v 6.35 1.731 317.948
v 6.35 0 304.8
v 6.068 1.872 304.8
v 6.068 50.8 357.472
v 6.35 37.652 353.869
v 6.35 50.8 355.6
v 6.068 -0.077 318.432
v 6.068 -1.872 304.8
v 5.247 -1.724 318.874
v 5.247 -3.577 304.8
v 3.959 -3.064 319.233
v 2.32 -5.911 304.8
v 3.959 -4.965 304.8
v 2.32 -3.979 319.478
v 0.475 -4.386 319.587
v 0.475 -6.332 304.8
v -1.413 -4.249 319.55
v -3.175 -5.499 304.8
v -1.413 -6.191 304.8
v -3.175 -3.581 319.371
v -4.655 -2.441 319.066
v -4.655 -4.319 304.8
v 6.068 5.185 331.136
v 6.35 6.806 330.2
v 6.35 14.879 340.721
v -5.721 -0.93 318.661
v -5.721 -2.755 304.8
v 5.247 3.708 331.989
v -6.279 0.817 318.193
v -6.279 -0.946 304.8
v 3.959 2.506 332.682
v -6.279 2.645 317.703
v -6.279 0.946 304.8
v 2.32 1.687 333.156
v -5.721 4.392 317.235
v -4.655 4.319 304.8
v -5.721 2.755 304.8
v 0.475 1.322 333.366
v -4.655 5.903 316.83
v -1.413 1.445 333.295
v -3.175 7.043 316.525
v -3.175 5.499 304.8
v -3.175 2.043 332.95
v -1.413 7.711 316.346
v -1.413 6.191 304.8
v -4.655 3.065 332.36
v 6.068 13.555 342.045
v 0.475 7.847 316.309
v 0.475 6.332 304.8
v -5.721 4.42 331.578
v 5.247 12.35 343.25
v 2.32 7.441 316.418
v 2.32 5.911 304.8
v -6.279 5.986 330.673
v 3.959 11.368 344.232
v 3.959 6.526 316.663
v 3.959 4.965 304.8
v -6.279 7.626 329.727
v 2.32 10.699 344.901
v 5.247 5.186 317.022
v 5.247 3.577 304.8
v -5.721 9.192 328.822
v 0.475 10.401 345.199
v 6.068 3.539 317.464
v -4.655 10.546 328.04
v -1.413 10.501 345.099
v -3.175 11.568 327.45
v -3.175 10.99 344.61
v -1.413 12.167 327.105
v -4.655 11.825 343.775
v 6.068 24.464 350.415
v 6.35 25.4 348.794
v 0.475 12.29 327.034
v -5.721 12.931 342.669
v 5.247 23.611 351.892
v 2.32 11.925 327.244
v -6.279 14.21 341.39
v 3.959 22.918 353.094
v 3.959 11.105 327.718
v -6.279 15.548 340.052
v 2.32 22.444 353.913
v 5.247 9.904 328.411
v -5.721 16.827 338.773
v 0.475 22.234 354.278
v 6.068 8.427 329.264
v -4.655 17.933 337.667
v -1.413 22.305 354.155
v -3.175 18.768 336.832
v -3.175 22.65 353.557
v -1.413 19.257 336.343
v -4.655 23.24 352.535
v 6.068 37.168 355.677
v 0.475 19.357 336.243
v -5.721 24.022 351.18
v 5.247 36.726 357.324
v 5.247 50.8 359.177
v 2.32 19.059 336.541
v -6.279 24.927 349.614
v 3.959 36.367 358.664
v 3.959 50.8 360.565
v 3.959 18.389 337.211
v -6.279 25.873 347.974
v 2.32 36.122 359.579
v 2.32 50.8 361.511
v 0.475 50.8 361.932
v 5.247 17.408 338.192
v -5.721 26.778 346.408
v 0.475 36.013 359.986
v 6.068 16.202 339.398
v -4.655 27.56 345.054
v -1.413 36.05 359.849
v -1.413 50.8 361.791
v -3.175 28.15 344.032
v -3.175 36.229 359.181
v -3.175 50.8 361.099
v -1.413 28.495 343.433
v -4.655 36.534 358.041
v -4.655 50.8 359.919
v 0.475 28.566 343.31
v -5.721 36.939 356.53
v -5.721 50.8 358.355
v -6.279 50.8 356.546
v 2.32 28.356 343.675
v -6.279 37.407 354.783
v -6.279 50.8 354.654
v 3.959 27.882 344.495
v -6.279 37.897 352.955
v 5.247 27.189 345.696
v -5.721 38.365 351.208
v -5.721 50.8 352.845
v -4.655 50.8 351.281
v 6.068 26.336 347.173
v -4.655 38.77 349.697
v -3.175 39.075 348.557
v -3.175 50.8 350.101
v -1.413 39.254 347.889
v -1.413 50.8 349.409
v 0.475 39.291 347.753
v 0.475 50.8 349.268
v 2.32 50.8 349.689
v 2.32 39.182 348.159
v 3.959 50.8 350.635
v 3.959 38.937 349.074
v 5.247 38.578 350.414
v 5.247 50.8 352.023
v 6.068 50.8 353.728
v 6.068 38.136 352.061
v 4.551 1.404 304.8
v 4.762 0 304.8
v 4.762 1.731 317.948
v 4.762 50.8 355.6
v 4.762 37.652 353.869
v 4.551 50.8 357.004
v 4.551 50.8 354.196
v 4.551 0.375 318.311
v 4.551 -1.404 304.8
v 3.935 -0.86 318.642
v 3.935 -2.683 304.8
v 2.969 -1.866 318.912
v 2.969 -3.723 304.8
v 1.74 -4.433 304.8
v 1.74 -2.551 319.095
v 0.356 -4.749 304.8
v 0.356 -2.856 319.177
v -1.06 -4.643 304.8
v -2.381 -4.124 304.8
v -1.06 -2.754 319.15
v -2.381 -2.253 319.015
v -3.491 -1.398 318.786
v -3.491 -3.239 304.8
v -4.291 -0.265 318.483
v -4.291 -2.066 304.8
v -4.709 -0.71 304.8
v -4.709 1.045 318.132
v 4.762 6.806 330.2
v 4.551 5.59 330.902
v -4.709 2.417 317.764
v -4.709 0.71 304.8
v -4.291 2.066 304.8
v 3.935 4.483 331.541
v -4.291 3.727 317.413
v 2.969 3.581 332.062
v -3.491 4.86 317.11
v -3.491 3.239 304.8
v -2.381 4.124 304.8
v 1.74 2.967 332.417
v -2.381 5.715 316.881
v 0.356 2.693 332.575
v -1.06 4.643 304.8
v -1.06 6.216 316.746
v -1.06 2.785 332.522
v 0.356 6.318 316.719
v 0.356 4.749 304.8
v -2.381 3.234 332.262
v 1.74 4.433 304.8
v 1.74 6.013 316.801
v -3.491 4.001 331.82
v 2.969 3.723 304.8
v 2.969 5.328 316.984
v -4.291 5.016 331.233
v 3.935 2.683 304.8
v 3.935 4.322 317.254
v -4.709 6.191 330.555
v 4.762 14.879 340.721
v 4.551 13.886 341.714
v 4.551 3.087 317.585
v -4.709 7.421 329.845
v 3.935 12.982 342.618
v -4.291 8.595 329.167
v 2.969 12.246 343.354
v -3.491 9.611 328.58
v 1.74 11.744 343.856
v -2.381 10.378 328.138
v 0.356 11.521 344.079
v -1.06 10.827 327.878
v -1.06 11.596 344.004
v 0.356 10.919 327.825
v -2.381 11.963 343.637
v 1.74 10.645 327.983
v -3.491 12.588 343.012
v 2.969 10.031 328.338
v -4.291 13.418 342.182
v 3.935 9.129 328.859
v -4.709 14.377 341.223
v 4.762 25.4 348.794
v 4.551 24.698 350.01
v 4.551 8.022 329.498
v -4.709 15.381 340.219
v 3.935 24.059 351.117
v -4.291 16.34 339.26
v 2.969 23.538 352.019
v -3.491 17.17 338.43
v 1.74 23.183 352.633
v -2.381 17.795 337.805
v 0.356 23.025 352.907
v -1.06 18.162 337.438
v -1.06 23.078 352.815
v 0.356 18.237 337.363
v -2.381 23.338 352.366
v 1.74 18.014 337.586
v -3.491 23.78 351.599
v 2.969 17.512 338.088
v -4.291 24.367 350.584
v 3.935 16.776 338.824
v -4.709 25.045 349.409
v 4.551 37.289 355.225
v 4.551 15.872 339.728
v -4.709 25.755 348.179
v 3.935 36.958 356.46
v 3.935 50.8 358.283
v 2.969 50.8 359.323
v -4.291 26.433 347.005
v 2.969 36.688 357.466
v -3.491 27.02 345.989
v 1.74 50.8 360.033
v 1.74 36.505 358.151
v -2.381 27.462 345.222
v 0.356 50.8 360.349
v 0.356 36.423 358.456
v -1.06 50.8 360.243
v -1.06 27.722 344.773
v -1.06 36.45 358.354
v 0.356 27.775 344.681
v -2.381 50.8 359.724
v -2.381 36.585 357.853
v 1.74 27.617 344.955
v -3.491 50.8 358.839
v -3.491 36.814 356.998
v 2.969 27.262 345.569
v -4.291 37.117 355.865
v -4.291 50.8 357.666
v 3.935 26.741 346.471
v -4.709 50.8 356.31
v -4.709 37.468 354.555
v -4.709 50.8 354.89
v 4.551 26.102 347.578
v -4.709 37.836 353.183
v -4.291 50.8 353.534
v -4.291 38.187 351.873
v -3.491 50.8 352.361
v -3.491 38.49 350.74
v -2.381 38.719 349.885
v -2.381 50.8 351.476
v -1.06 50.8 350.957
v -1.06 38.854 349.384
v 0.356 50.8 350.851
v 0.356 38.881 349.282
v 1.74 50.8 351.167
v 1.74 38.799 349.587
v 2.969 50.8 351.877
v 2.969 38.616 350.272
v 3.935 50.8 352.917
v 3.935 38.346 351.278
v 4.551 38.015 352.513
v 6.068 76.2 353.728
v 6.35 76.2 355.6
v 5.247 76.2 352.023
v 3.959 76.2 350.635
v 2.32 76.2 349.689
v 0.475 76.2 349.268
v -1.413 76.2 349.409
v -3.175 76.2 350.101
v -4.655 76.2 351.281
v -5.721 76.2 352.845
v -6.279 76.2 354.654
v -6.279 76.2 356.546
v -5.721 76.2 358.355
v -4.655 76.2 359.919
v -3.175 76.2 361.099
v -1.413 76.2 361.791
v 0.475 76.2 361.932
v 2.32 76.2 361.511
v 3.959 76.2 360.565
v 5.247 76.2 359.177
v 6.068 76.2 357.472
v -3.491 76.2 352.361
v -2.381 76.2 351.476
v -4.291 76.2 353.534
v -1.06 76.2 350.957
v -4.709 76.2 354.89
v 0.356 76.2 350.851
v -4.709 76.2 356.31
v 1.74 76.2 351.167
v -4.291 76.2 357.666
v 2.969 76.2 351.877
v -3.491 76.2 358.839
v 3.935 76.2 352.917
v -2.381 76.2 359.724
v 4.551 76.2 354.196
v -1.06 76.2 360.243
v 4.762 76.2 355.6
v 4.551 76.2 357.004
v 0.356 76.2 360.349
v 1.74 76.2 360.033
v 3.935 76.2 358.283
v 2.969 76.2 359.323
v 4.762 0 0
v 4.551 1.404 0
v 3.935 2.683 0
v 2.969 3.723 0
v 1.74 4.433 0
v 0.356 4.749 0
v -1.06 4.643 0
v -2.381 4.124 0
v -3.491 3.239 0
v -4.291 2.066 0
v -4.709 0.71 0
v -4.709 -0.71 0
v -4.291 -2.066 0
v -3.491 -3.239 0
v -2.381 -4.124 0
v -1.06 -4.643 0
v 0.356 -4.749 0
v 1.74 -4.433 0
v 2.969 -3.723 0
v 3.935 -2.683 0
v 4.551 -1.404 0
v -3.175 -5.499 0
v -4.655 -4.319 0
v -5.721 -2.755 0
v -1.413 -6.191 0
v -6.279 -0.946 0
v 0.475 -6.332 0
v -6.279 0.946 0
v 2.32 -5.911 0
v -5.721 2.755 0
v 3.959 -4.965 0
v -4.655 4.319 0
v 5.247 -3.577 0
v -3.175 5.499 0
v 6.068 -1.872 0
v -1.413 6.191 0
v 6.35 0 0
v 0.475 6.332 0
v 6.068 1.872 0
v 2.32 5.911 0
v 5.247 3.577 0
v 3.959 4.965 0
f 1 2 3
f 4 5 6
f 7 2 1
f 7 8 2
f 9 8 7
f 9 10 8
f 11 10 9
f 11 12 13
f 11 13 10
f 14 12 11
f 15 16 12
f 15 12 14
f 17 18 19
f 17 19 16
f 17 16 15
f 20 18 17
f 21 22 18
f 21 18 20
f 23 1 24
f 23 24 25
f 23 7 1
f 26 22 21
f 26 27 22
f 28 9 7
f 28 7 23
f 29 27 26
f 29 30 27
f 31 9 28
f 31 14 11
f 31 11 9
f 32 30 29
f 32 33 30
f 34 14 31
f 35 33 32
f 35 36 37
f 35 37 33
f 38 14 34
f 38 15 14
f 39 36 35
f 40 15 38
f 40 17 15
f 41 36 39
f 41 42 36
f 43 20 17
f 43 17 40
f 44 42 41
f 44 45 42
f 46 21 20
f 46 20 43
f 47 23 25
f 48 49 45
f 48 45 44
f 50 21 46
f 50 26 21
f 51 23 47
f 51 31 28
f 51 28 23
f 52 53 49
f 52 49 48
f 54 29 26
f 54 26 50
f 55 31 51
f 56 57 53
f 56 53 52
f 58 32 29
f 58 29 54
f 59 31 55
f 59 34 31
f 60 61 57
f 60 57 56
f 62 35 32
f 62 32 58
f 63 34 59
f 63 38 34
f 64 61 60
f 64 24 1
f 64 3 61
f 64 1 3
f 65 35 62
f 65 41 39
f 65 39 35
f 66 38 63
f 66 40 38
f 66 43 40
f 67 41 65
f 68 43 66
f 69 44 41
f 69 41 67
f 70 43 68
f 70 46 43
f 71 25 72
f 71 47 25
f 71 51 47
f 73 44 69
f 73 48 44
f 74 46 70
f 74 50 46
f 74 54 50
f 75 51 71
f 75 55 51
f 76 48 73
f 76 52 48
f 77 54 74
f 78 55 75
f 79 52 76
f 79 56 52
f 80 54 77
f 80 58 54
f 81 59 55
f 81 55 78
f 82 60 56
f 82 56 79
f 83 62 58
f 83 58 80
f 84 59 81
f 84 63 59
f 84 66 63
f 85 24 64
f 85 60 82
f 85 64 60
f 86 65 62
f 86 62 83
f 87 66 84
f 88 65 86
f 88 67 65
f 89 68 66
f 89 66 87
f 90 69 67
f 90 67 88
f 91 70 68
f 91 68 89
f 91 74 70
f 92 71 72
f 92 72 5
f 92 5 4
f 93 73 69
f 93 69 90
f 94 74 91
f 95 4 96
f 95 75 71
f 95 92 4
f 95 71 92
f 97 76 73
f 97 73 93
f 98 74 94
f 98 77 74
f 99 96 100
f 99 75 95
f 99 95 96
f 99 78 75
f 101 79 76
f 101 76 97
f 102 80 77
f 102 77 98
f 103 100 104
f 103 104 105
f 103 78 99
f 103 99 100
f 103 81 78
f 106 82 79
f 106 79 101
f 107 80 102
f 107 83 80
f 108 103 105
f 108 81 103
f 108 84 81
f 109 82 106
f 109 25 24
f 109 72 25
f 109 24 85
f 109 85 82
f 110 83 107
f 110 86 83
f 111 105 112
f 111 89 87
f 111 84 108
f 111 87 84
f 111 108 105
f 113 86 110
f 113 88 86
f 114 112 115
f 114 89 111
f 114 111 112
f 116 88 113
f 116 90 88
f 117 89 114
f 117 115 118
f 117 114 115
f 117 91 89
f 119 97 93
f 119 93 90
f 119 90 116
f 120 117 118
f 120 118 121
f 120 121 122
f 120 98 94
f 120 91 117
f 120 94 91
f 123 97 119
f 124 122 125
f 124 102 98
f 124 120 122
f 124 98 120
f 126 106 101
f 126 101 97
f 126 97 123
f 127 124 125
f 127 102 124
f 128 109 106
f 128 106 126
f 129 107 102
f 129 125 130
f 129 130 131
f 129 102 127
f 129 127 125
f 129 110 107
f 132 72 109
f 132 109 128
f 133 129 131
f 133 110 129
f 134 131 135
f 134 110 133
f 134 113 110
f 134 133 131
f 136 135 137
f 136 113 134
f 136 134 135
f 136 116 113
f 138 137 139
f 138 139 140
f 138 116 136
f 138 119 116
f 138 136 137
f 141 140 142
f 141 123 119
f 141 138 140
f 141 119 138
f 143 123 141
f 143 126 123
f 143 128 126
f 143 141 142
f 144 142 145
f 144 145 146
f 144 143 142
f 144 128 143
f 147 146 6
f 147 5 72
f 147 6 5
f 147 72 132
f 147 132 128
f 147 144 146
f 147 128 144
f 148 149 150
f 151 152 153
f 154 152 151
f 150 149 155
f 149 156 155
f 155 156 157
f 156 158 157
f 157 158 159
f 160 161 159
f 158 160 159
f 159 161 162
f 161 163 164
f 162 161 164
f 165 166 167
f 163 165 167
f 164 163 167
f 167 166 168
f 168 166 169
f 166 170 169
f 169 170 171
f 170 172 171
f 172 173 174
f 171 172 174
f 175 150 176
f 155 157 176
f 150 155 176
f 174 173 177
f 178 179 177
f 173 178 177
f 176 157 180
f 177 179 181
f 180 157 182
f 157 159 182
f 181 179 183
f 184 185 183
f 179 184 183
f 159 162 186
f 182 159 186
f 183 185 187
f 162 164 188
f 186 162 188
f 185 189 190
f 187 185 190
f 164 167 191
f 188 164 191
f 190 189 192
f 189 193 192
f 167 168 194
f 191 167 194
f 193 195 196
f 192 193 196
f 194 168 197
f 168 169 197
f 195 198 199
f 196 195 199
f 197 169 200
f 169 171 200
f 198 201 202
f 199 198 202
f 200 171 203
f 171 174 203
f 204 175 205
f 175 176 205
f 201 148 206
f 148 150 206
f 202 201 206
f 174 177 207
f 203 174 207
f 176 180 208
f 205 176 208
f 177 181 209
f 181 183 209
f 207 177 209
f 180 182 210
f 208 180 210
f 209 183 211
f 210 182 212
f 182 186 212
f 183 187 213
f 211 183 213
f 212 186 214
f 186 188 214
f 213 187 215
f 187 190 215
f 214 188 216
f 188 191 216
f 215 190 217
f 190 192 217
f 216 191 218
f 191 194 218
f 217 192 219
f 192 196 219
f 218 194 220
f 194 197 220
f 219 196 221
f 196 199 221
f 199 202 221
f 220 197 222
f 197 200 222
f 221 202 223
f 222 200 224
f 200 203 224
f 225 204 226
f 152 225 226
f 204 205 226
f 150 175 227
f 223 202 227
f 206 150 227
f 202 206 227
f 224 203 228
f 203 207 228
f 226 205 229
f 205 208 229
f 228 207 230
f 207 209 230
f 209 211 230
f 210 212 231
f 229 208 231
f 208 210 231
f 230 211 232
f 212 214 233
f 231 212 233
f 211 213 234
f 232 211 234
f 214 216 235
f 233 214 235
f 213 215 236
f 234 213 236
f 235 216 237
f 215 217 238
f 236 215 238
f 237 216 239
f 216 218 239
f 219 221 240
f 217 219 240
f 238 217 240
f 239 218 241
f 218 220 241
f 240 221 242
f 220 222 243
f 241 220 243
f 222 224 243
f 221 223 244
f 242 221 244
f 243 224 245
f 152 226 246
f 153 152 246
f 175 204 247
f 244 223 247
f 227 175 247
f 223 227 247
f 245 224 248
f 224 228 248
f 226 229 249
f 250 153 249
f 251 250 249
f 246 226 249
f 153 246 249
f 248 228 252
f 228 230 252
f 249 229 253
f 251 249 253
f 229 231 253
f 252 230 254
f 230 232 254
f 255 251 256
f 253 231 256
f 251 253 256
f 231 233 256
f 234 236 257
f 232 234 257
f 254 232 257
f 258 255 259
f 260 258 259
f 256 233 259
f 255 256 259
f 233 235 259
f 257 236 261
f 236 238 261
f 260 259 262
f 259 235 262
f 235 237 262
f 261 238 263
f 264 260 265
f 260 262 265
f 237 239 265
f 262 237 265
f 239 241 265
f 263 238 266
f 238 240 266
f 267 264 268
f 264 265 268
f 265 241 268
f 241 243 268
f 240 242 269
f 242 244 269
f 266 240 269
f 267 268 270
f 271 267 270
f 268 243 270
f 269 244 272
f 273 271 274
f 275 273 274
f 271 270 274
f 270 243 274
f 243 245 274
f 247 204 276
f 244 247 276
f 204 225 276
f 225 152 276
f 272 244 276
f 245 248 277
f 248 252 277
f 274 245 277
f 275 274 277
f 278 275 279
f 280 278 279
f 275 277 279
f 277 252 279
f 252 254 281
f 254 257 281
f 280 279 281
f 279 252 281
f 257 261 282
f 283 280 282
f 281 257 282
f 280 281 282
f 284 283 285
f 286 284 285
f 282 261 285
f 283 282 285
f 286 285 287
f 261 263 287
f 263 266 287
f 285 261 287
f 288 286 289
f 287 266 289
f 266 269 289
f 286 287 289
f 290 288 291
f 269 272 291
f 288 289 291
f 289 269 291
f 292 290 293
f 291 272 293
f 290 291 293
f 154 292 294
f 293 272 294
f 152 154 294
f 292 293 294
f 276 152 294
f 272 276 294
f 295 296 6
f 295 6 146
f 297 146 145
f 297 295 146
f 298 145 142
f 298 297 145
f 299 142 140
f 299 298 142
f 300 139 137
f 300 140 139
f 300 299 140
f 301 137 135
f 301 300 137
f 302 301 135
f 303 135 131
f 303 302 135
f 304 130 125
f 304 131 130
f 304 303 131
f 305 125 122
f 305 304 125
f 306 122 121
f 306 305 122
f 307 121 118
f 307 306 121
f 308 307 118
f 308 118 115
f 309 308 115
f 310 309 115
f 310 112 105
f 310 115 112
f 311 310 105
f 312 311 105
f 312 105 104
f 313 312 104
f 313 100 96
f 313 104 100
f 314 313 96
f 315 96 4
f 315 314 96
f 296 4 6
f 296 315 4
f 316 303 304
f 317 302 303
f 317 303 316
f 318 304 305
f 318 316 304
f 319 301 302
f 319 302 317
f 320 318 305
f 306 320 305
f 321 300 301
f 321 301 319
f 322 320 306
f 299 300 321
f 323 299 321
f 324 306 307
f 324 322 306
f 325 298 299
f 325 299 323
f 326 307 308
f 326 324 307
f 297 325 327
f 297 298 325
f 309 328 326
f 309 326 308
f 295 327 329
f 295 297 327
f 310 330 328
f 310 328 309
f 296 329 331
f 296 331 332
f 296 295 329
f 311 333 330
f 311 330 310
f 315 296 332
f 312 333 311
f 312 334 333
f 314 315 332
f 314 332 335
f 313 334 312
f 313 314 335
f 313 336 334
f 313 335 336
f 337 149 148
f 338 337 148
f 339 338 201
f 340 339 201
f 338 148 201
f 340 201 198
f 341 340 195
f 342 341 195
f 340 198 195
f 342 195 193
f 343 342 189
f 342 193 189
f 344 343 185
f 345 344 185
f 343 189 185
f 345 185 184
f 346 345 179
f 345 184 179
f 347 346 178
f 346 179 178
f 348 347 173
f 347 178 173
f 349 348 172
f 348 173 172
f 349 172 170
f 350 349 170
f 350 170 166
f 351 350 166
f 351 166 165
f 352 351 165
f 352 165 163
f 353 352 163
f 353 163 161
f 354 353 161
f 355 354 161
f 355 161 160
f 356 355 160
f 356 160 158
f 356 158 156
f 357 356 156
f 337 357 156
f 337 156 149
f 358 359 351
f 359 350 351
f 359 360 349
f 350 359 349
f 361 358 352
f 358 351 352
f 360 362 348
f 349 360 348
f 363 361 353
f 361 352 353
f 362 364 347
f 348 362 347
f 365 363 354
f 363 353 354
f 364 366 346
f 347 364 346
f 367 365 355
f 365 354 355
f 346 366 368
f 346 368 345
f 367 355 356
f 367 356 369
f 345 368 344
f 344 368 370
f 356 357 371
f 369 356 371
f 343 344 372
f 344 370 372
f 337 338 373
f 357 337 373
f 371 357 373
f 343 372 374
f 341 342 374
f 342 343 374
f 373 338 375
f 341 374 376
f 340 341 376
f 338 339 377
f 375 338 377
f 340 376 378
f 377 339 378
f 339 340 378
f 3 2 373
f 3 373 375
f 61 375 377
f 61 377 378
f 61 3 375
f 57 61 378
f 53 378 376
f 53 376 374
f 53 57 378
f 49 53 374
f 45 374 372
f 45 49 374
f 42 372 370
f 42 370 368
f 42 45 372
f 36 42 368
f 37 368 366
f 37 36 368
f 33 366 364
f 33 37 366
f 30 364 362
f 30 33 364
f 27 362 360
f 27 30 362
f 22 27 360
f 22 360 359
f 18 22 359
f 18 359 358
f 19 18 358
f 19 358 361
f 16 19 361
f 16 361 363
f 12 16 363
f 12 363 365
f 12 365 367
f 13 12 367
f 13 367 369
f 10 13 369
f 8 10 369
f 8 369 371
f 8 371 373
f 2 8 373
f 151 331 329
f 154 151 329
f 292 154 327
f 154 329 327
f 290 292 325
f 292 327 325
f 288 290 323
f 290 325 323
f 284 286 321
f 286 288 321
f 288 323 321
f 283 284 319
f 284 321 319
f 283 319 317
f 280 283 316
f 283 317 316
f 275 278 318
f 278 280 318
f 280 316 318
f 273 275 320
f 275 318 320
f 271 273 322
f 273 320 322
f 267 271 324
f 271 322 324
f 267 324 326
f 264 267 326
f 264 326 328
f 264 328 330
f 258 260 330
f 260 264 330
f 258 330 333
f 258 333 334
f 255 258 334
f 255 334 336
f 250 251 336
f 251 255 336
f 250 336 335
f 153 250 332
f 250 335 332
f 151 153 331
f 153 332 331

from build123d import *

# Parameters (mm, degrees)
SWEEP1_PROFILE_R     = 6.35
CUT_SWEEP1_PROFILE_R = 4.7625


with BuildPart() as part:
    # Sweep1: sweep along a curve in space
    with BuildLine() as sweep1_path:
        Line((0, 0, 0), (0, 0, 304.8))
        ThreePointArc((0, 0, 304.8), (0, 14.878975516, 340.721024484), (0, 50.8, 355.6))
        Line((0, 50.8, 355.6), (0, 76.2, 355.6))
    # Sweep1 profile (on start of the path) → Sweep1 (sweep)
    with BuildSketch(Plane.XY):
        Circle(SWEEP1_PROFILE_R)
    sweep(path=sweep1_path.line)

    # Cut-Sweep1: sweep along a curve in space
    with BuildLine() as cut_sweep1_path:
        Line((0, 0, 0), (0, 0, 304.8))
        ThreePointArc((0, 0, 304.8), (0, 14.878975516, 340.721024484), (0, 50.8, 355.6))
        Line((0, 50.8, 355.6), (0, 76.2, 355.6))
    # Cut-Sweep1 profile (on start of the path) → Cut-Sweep1 (sweep, cut)
    with BuildSketch(Plane.XY):
        Circle(CUT_SWEEP1_PROFILE_R)
    sweep(path=cut_sweep1_path.line, mode=Mode.SUBTRACT)


solid = part.part
